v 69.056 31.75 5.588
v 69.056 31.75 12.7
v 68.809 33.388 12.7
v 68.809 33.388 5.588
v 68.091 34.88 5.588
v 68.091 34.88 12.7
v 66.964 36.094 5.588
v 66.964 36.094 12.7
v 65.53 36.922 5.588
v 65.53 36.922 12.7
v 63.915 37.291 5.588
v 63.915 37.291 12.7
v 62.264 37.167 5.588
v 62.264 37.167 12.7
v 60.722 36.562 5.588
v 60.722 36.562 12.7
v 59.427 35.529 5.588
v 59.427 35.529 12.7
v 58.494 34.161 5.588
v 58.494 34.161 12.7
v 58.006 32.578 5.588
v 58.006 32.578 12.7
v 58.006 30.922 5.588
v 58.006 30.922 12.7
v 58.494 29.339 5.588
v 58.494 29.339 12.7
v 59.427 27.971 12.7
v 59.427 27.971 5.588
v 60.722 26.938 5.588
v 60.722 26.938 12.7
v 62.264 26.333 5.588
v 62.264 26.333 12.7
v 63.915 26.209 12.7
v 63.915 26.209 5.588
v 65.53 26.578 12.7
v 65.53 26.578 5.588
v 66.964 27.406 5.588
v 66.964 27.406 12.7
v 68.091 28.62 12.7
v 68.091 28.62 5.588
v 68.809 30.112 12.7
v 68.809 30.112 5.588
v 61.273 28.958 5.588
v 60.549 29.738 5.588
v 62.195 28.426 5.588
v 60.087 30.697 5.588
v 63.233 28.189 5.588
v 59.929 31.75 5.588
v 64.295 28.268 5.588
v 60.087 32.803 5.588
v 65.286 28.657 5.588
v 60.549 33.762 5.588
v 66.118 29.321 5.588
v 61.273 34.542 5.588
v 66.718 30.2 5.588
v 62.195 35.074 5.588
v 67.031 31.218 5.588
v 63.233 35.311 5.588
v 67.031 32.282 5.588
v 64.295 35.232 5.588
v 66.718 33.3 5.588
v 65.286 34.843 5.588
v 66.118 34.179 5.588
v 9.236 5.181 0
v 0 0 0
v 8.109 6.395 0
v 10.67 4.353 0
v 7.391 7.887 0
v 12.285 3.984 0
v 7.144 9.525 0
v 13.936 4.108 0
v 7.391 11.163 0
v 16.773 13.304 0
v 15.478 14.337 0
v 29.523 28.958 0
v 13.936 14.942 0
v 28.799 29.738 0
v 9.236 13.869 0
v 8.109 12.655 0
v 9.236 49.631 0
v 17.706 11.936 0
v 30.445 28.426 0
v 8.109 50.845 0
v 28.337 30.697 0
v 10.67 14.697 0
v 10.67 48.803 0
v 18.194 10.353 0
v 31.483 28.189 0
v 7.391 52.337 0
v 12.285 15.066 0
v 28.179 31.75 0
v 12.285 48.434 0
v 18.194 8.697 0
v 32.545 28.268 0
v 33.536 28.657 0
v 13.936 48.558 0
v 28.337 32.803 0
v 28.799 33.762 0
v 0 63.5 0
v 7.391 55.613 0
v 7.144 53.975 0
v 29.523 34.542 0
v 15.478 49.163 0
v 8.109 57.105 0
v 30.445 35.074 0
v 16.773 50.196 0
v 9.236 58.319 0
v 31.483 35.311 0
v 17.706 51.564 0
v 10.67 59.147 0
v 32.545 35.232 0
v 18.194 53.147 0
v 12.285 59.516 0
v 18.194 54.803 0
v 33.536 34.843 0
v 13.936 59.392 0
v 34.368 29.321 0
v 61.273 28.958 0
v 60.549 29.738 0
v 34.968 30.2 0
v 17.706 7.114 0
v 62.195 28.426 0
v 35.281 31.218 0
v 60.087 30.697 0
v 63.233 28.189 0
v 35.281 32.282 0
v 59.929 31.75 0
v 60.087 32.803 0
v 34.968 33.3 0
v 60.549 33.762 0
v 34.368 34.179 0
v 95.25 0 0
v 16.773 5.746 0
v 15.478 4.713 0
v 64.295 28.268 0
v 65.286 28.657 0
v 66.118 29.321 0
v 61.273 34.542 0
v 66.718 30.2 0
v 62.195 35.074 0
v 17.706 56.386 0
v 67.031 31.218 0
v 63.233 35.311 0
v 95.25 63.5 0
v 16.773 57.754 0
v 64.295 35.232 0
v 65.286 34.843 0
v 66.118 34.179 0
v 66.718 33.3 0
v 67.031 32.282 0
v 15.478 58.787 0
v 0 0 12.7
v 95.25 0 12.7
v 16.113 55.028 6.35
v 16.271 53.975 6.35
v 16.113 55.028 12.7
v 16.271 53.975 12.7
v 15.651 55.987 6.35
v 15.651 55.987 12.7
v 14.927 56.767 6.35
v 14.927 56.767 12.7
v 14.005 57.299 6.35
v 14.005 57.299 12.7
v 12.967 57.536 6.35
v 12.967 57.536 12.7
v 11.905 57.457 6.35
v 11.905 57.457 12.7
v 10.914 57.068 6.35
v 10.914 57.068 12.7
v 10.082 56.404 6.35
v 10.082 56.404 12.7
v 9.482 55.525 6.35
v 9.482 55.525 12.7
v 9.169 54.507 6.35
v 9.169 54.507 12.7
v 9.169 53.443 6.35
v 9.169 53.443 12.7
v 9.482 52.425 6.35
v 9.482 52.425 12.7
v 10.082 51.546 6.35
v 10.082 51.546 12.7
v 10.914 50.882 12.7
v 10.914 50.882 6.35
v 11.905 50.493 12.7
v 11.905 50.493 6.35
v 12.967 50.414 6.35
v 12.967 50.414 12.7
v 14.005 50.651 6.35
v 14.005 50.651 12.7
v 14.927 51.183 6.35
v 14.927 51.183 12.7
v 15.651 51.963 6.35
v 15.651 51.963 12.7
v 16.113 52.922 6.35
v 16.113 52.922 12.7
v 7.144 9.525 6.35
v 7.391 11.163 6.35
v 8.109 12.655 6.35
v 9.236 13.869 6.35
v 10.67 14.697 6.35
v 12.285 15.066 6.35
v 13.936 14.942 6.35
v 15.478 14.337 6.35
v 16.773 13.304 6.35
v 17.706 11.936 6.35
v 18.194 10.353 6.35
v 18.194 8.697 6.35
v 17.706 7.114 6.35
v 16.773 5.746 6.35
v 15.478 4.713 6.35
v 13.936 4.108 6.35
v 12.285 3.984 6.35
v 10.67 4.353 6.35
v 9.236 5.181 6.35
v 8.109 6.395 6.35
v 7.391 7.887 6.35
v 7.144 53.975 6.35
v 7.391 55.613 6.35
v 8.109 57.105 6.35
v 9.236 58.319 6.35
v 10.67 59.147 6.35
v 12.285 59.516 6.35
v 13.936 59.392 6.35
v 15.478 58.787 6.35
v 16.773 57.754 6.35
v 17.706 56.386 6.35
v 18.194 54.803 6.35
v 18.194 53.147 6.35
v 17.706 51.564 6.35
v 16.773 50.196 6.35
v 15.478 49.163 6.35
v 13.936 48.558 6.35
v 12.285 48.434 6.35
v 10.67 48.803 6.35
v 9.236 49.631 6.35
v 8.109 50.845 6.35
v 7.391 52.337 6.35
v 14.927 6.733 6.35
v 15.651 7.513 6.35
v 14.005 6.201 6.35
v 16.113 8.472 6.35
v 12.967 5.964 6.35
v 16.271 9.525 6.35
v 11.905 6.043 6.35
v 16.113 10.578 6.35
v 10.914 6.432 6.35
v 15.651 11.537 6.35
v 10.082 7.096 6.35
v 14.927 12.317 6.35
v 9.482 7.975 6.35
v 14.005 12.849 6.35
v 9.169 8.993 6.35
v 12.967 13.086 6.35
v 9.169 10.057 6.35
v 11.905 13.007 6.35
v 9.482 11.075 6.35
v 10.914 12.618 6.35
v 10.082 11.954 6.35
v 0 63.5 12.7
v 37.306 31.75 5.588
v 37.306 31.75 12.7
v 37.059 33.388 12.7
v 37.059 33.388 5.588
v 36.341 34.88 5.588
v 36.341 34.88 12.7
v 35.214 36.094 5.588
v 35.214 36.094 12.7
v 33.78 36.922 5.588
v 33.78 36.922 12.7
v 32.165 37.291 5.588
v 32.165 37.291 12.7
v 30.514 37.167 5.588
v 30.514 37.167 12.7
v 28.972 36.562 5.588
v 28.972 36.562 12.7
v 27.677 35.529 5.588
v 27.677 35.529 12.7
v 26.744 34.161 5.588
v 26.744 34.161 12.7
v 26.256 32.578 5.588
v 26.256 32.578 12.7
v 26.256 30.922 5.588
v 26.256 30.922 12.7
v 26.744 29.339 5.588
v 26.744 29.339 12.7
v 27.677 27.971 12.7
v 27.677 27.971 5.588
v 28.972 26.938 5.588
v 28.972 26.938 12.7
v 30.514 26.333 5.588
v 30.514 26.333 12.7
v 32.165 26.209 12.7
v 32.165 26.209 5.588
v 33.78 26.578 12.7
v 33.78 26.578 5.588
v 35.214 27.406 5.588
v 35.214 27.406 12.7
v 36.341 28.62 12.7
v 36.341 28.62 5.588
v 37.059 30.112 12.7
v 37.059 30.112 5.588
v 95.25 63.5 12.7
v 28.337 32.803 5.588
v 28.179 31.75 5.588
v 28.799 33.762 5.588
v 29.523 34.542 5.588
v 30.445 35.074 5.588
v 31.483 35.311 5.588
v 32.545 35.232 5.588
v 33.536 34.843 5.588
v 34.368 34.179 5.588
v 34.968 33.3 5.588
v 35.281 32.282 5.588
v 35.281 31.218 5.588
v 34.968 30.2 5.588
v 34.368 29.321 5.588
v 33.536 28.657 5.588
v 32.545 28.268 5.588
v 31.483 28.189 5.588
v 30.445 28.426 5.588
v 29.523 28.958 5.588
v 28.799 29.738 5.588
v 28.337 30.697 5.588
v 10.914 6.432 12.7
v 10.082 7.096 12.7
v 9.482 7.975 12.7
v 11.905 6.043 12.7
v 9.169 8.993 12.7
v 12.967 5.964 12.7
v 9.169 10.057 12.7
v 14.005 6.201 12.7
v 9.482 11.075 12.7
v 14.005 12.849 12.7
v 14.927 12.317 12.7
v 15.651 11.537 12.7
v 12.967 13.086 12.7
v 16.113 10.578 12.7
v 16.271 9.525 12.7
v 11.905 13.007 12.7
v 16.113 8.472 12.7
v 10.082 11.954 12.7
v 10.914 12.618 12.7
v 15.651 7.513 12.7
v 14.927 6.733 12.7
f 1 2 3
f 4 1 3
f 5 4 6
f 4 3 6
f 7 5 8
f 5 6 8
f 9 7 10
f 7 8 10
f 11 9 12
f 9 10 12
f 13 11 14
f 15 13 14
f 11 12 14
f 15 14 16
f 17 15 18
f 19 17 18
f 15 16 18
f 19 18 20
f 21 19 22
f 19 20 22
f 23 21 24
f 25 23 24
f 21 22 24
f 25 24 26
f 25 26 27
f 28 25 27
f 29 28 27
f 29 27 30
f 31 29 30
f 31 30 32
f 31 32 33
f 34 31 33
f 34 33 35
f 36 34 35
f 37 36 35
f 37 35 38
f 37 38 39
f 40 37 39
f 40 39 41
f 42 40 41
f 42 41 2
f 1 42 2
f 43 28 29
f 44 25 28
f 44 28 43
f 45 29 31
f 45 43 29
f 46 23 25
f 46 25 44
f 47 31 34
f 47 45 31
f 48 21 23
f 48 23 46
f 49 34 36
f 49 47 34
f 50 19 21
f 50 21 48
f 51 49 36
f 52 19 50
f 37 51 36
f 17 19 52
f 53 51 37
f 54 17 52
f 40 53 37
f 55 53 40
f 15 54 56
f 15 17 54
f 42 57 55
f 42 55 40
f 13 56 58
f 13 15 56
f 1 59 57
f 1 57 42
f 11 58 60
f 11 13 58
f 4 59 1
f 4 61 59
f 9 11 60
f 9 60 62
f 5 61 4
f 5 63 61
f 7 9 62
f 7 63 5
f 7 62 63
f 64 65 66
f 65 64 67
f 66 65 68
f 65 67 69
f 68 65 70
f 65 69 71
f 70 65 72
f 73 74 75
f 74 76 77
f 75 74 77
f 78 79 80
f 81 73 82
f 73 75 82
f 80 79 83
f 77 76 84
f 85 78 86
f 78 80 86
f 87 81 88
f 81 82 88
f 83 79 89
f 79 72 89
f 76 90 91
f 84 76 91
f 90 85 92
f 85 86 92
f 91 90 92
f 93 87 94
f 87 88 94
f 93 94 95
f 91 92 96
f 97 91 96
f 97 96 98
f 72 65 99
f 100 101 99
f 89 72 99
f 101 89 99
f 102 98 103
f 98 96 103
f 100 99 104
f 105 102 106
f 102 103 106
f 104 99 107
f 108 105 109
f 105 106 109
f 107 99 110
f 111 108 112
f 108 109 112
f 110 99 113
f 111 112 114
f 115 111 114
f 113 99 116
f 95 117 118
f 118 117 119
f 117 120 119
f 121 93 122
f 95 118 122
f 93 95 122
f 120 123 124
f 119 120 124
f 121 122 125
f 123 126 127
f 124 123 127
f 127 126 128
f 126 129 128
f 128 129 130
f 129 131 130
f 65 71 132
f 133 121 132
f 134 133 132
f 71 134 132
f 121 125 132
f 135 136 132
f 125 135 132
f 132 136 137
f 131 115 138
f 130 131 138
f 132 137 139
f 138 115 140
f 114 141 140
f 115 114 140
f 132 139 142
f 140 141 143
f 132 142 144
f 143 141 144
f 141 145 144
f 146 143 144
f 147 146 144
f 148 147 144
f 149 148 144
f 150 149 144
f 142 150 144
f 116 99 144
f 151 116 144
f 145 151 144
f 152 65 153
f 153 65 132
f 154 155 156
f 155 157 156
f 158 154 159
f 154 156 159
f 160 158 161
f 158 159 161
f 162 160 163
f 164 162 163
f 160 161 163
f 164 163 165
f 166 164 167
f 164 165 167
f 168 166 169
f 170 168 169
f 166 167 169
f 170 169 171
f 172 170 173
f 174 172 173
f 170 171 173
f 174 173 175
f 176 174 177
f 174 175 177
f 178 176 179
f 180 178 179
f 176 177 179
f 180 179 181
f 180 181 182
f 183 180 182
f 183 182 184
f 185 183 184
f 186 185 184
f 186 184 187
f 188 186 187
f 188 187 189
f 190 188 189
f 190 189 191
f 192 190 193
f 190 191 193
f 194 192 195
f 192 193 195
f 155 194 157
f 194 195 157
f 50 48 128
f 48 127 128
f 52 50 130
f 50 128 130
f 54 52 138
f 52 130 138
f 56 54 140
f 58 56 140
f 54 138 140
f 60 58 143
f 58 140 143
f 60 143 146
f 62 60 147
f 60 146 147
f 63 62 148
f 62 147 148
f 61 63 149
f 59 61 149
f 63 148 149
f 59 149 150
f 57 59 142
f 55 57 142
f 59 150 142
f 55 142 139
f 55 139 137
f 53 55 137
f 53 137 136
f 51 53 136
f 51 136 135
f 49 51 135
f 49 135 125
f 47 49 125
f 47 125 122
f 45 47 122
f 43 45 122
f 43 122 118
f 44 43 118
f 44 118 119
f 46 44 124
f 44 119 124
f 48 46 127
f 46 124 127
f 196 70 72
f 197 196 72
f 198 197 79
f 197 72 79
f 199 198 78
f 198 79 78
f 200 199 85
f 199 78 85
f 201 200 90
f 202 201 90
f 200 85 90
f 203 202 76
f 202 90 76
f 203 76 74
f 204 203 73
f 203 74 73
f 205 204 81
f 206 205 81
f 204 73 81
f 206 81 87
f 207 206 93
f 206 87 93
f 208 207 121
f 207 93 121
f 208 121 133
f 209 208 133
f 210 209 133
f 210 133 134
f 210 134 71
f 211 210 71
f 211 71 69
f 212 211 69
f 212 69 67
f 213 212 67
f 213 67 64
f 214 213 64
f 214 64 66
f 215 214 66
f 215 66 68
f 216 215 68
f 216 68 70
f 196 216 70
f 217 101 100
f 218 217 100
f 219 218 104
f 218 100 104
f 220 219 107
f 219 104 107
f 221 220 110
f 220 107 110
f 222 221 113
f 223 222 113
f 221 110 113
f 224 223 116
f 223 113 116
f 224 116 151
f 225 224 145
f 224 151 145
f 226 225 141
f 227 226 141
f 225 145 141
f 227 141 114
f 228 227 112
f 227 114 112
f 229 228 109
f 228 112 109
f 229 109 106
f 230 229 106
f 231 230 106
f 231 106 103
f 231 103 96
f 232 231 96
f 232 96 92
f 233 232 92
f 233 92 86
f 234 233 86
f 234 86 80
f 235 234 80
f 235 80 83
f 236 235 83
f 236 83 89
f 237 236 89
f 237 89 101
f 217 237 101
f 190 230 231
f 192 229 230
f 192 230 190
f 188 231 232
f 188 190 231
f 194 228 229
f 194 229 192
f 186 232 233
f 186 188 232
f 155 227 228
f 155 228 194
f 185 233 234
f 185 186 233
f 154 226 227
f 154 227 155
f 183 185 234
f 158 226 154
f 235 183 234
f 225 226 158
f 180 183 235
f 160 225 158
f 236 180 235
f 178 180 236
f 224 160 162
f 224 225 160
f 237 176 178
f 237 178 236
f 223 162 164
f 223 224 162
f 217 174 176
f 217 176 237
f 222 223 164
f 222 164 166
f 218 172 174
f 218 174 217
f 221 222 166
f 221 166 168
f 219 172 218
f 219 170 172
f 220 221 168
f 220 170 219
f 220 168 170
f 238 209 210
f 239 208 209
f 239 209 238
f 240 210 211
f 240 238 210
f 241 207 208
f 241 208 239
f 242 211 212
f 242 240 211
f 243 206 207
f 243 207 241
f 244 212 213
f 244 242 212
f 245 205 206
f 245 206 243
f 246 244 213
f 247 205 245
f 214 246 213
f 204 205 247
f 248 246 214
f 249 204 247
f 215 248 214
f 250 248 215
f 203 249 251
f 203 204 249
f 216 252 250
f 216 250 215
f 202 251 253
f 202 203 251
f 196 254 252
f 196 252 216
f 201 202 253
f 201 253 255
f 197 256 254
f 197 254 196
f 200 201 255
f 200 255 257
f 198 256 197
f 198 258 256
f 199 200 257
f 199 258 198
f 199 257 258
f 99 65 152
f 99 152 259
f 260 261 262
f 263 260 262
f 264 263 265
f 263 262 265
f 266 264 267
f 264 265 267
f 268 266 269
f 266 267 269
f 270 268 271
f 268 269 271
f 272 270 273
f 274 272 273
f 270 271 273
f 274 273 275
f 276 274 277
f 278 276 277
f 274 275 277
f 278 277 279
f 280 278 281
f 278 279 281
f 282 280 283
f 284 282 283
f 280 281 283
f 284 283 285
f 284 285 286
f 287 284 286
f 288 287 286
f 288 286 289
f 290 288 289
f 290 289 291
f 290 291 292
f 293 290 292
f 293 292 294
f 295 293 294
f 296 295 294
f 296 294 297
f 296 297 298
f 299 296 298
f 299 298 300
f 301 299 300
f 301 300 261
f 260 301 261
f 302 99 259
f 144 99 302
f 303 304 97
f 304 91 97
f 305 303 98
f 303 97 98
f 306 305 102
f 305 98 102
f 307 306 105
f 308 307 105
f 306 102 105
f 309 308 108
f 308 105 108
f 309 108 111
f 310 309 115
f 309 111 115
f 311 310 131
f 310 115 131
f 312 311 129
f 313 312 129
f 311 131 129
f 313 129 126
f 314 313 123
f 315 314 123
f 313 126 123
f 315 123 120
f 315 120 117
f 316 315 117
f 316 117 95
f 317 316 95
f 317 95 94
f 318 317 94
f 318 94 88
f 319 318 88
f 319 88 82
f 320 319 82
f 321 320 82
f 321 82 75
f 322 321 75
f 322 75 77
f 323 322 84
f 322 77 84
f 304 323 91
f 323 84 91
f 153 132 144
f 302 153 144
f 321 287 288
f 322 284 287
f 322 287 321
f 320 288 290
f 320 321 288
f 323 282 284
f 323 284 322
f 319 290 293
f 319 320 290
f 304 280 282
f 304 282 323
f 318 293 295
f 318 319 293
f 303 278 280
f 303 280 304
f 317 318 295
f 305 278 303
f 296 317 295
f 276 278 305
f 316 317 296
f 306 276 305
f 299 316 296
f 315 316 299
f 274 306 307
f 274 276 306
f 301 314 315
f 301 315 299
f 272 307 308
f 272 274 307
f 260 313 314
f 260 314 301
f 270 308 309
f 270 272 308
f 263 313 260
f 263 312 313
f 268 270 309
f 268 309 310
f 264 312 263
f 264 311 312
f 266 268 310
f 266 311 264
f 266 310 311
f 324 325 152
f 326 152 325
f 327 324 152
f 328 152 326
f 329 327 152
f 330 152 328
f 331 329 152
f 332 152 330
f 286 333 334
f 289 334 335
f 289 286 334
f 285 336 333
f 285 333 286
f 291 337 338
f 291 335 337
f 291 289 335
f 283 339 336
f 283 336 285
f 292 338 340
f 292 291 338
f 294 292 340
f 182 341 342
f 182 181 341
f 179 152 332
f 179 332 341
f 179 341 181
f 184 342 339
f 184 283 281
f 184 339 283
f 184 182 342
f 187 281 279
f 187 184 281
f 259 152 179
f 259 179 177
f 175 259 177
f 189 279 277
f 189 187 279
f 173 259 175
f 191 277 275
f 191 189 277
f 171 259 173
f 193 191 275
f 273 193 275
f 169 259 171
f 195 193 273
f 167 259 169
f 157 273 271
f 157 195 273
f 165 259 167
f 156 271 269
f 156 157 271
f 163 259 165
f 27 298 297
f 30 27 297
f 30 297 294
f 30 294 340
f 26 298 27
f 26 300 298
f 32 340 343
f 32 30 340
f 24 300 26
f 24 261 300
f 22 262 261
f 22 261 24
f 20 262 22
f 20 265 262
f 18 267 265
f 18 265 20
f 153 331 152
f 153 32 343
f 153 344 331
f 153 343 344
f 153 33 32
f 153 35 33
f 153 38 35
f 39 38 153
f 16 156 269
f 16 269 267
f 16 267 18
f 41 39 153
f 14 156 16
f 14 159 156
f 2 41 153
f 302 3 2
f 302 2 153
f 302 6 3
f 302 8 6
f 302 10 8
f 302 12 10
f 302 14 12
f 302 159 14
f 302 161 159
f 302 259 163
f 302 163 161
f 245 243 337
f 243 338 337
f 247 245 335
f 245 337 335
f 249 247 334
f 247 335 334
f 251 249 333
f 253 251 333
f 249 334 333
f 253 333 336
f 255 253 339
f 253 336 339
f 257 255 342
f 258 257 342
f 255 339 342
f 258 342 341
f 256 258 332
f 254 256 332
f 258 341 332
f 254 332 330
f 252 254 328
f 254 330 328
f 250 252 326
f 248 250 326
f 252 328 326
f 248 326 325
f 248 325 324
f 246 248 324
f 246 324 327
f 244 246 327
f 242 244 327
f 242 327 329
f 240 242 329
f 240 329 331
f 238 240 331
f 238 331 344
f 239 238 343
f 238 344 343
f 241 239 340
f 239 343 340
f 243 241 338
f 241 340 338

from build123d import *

# Parameters (mm, degrees)
SKETCH1_W                                        = 95.25
SKETCH1_H                                        = 63.5
BOSS_EXTRUDE1_DEPTH                              = 12.7
CBORE_FOR_1_4_SOCKET_HEAD_CAP_SCREW1_D           = 7.14248
CBORE_FOR_1_4_SOCKET_HEAD_CAP_SCREW1_CBORE_D     = 11.1125
CBORE_FOR_1_4_SOCKET_HEAD_CAP_SCREW1_CBORE_DEPTH = 6.35
CBORE_FOR_1_4_SOCKET_HEAD_CAP_SCREW2_D           = 7.14248
CBORE_FOR_1_4_SOCKET_HEAD_CAP_SCREW2_CBORE_D     = 11.1125
CBORE_FOR_1_4_SOCKET_HEAD_CAP_SCREW2_CBORE_DEPTH = 7.112


with BuildPart() as part:
    # Sketch1 → Boss-Extrude1 (new body)
    with BuildSketch(Plane.XY):
        with Locations((47.625, 31.75)):
            Rectangle(SKETCH1_W, SKETCH1_H)
    extrude(amount=BOSS_EXTRUDE1_DEPTH)

    # CBORE for 1/4 Socket Head Cap Screw1 (through all)
    with Locations(Plane(origin=(0, 0, 0), x_dir=(-1, 0, 0), z_dir=(0, 0, -1))):
        with Locations((-12.7, 53.975), (-12.7, 9.525)):
            CounterBoreHole(CBORE_FOR_1_4_SOCKET_HEAD_CAP_SCREW1_D / 2, CBORE_FOR_1_4_SOCKET_HEAD_CAP_SCREW1_CBORE_D / 2, CBORE_FOR_1_4_SOCKET_HEAD_CAP_SCREW1_CBORE_DEPTH)

    # CBORE for 1/4 Socket Head Cap Screw2 (through all)
    with Locations(Plane.XY.offset(12.7)):
        with Locations((31.75, 31.75), (63.5, 31.75)):
            CounterBoreHole(CBORE_FOR_1_4_SOCKET_HEAD_CAP_SCREW2_D / 2, CBORE_FOR_1_4_SOCKET_HEAD_CAP_SCREW2_CBORE_D / 2, CBORE_FOR_1_4_SOCKET_HEAD_CAP_SCREW2_CBORE_DEPTH)


solid = part.part
